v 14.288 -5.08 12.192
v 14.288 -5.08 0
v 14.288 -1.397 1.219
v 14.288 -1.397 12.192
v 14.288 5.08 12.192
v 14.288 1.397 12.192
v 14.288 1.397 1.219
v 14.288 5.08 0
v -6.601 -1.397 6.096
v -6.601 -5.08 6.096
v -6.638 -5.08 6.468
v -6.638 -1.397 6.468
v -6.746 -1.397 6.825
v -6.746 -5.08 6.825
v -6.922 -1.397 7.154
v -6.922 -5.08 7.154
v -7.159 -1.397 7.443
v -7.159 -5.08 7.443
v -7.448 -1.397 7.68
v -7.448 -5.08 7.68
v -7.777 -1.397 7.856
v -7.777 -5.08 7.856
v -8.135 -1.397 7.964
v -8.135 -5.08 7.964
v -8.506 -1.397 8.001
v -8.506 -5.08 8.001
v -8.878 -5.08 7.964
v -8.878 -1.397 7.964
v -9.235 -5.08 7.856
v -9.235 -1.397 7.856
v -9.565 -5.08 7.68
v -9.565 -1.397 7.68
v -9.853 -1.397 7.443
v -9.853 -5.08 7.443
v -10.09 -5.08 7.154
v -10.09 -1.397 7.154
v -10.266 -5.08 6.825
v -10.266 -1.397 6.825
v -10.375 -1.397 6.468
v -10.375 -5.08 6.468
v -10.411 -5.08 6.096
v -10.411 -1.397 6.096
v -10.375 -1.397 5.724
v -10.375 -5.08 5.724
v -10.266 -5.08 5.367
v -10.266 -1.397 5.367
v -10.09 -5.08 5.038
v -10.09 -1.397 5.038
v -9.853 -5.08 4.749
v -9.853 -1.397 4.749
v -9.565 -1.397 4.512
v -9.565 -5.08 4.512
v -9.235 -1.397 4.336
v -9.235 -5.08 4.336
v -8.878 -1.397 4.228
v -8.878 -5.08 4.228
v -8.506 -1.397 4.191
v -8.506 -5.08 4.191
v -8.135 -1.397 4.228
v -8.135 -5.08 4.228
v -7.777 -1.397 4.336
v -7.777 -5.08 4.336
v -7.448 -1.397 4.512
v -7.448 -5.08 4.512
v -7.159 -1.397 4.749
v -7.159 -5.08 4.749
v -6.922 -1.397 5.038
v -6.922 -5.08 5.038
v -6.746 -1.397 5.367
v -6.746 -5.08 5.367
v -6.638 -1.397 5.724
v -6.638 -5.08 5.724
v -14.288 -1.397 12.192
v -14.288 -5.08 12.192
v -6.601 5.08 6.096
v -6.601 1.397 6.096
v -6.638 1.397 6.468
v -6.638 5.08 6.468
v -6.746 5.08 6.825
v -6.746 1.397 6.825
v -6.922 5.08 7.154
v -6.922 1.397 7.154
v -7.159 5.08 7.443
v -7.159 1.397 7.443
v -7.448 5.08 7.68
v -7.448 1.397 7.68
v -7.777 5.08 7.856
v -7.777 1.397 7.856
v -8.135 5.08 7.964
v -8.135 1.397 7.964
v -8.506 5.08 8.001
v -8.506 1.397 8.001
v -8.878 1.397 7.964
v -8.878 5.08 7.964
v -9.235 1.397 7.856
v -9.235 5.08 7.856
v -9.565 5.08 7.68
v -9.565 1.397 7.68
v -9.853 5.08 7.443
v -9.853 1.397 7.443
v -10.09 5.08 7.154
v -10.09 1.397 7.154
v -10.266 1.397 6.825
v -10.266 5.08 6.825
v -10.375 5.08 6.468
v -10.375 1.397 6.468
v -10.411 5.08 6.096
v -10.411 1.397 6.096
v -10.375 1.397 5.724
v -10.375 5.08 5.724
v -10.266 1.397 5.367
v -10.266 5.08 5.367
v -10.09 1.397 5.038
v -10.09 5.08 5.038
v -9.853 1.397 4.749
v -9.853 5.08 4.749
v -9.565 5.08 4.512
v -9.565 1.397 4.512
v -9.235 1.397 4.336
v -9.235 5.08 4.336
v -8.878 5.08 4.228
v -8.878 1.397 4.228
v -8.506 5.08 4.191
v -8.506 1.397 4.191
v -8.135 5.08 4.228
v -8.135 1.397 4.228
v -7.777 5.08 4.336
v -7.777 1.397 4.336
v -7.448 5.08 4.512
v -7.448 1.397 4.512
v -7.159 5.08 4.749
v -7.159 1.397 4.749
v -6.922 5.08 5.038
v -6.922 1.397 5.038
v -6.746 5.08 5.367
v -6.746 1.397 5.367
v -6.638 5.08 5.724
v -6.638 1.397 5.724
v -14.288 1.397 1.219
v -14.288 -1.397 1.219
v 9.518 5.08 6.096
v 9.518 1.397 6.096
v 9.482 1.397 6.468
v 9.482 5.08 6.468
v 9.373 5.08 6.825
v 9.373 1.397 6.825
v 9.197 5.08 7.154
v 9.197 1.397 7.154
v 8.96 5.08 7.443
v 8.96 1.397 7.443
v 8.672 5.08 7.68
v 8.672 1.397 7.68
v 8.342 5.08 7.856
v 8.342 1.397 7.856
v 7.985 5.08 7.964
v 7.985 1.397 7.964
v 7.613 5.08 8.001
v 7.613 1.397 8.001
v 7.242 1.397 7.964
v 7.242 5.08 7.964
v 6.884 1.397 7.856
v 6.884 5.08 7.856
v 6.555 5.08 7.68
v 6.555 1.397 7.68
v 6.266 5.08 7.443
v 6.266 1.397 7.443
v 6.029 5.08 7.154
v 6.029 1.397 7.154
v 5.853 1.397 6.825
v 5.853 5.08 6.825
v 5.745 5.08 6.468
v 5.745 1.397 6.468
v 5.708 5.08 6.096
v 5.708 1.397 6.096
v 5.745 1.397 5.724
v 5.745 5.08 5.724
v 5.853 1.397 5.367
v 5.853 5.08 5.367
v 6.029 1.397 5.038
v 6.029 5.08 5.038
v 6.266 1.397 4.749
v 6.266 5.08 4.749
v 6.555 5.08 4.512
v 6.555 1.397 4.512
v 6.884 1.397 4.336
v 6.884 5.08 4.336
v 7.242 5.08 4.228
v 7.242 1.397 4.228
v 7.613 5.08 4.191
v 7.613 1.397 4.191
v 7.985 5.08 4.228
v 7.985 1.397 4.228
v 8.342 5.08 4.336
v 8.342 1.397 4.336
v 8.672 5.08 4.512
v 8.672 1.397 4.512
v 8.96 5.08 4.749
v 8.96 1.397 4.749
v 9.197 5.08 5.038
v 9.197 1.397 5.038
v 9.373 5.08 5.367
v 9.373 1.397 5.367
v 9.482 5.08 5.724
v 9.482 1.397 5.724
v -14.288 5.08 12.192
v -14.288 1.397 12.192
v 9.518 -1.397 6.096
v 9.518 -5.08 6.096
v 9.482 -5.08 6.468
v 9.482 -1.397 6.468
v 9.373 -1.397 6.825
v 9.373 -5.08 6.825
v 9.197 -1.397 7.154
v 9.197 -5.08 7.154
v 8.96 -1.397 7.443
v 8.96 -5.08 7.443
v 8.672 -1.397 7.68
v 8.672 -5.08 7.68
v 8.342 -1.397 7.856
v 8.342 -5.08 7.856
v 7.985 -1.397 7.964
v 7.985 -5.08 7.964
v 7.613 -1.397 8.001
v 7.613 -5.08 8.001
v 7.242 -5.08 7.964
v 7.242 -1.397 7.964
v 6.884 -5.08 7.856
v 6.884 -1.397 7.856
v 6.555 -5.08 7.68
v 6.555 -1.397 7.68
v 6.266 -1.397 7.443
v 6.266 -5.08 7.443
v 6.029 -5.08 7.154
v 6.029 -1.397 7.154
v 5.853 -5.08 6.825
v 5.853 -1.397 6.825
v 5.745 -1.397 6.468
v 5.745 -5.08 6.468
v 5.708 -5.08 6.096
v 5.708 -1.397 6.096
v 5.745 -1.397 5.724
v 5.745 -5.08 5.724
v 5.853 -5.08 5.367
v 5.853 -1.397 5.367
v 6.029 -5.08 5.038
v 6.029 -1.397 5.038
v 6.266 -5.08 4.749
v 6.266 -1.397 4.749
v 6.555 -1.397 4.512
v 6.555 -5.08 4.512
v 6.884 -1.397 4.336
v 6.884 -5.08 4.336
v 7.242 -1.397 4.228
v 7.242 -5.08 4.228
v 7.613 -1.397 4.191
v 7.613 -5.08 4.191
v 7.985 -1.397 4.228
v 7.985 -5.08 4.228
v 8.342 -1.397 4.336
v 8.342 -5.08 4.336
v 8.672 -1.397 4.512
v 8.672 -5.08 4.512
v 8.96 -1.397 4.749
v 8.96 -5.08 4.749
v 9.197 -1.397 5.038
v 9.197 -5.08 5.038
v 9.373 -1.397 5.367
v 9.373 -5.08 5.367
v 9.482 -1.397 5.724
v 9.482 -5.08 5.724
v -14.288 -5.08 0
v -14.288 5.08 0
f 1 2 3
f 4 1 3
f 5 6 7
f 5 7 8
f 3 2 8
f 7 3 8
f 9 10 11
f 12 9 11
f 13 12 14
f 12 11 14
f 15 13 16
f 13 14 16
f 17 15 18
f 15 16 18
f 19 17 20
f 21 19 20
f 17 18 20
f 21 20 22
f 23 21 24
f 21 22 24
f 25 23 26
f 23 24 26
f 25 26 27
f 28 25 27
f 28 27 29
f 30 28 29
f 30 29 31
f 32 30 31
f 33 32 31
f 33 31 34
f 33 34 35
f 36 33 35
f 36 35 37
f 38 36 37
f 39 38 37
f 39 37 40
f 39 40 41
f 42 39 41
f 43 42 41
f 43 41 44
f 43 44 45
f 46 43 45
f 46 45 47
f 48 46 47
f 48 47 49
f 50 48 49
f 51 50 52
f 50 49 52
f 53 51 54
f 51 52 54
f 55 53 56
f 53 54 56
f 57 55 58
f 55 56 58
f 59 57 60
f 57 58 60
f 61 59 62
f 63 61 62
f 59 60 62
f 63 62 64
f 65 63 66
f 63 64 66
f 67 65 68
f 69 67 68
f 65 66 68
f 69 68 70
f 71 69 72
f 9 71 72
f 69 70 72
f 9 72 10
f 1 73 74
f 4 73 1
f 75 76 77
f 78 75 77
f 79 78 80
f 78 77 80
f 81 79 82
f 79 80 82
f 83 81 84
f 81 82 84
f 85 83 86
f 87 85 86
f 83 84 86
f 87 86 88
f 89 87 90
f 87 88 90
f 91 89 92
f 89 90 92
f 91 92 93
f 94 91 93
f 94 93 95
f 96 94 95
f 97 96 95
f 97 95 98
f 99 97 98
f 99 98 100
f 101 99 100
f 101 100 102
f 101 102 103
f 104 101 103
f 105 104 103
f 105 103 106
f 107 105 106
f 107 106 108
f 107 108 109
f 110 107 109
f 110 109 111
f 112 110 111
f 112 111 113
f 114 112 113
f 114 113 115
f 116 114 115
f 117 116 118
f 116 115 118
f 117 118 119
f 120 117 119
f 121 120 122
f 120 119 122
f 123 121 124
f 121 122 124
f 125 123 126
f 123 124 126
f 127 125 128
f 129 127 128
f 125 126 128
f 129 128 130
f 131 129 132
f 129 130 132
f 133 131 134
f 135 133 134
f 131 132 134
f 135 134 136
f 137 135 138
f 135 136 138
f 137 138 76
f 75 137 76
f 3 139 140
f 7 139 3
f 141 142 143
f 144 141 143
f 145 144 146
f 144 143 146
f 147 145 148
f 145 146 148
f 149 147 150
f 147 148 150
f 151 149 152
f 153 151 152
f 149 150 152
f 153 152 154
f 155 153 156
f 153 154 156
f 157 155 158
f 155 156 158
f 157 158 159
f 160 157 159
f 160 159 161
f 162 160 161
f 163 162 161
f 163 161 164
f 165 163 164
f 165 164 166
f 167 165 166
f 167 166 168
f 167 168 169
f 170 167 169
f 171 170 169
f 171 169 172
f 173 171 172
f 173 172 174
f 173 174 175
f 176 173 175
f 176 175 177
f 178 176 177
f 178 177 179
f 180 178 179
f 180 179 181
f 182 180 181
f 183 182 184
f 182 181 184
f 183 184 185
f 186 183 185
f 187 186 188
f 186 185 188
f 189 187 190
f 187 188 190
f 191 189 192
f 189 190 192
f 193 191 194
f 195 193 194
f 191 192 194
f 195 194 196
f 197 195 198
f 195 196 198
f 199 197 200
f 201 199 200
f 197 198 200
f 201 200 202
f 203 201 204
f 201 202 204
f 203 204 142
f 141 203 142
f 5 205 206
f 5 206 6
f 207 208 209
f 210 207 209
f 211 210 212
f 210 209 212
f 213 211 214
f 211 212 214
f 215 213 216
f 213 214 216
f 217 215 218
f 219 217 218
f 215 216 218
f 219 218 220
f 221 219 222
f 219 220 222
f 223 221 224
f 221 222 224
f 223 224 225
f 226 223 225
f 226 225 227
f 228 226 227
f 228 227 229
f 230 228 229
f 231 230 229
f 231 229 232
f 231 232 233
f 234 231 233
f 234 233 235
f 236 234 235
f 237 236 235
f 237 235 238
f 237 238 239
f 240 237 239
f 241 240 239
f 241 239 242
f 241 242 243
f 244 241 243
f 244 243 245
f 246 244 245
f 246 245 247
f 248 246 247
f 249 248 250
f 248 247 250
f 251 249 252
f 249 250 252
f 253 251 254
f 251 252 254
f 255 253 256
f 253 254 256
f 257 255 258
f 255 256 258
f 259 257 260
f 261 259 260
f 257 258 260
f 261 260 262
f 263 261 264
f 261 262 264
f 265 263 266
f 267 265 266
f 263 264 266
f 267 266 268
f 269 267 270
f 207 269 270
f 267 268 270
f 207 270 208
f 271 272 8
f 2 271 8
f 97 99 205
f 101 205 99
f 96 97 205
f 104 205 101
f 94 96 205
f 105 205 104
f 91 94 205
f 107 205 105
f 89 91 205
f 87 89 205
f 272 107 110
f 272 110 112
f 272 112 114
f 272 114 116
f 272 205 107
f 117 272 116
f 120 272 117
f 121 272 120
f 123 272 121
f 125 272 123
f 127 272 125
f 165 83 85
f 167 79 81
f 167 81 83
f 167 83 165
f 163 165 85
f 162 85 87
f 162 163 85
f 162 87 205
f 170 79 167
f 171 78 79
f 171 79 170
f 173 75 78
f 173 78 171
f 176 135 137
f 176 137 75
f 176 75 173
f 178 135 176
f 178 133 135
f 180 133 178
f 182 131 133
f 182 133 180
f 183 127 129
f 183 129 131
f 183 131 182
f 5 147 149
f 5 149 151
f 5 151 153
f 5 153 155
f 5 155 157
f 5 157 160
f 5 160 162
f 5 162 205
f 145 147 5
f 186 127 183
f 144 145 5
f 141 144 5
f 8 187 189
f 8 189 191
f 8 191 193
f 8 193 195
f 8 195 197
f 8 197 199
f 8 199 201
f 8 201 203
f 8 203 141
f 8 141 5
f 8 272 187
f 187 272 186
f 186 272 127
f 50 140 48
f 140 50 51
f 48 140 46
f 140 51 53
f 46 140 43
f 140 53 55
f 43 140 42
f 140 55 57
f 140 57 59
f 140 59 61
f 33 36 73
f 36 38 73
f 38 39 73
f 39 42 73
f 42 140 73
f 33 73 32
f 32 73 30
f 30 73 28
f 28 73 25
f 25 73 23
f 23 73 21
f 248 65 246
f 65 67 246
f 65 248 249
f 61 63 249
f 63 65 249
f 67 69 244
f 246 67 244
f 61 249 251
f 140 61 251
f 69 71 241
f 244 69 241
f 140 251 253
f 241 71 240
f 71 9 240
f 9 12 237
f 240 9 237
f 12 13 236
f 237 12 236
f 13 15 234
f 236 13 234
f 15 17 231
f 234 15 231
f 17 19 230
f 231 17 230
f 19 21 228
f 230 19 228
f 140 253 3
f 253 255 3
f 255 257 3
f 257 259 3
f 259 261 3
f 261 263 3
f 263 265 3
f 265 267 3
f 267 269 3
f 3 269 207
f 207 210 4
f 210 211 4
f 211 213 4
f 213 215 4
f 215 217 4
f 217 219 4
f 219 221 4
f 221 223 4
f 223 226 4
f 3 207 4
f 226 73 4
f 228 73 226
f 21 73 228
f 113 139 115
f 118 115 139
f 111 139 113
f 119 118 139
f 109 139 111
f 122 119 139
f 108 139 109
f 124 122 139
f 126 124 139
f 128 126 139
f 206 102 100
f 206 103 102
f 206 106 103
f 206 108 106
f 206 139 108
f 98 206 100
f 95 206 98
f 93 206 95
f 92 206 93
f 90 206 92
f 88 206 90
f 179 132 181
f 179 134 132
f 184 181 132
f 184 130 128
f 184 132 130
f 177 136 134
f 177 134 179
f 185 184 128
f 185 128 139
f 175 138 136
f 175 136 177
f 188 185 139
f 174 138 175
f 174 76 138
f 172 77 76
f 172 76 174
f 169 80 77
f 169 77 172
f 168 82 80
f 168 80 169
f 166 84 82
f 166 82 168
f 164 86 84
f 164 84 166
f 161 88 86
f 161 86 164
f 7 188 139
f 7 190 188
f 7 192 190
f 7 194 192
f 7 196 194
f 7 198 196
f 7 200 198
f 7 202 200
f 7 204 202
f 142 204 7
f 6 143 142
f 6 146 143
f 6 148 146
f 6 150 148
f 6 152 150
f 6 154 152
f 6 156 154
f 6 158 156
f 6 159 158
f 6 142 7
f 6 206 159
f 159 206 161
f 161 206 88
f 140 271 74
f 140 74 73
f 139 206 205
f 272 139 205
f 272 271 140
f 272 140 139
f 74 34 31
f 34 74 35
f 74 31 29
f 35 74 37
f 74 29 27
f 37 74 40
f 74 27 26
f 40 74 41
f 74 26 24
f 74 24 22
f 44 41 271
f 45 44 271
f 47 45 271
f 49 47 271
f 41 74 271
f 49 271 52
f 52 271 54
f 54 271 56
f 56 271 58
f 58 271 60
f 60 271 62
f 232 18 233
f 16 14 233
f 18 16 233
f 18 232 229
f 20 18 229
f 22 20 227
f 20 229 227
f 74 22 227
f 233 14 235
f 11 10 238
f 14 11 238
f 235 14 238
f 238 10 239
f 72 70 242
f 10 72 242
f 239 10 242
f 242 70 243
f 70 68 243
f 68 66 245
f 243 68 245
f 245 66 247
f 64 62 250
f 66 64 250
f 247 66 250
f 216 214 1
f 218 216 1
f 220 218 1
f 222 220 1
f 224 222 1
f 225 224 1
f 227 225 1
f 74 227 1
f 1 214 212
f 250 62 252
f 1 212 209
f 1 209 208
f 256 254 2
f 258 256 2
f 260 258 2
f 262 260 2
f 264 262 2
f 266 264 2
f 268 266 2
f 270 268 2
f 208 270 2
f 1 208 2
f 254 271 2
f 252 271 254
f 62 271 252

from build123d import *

# Parameters (mm, degrees)
F0_W     = 28.575
F0_H     = 10.16
F1_DEPTH = 12.192
F2_W     = 28.575
F2_H     = 2.794
F3_DEPTH = 10.9728
F4_R     = 1.905
F5_DEPTH = 25.4


with BuildPart() as f1:
    # F0 (on Top) → F1 (new body)
    with BuildSketch(Plane.XY):
        Rectangle(F0_W, F0_H)
    extrude(amount=F1_DEPTH)

    # F2 (on face) → F3 (cut)
    with BuildSketch(Plane.XY.offset(12.192)):
        Rectangle(F2_W, F2_H)
    extrude(amount=-F3_DEPTH, mode=Mode.SUBTRACT)

    # F4 (on face) → F5 (cut)
    with BuildSketch(Plane.XZ.offset(5.08)):
        with Locations((-8.50641, 6.096)):
            Circle(F4_R)
        with Locations((7.61332, 6.096)):
            Circle(F4_R)
    extrude(amount=-F5_DEPTH, mode=Mode.SUBTRACT)


solid = f1.part
